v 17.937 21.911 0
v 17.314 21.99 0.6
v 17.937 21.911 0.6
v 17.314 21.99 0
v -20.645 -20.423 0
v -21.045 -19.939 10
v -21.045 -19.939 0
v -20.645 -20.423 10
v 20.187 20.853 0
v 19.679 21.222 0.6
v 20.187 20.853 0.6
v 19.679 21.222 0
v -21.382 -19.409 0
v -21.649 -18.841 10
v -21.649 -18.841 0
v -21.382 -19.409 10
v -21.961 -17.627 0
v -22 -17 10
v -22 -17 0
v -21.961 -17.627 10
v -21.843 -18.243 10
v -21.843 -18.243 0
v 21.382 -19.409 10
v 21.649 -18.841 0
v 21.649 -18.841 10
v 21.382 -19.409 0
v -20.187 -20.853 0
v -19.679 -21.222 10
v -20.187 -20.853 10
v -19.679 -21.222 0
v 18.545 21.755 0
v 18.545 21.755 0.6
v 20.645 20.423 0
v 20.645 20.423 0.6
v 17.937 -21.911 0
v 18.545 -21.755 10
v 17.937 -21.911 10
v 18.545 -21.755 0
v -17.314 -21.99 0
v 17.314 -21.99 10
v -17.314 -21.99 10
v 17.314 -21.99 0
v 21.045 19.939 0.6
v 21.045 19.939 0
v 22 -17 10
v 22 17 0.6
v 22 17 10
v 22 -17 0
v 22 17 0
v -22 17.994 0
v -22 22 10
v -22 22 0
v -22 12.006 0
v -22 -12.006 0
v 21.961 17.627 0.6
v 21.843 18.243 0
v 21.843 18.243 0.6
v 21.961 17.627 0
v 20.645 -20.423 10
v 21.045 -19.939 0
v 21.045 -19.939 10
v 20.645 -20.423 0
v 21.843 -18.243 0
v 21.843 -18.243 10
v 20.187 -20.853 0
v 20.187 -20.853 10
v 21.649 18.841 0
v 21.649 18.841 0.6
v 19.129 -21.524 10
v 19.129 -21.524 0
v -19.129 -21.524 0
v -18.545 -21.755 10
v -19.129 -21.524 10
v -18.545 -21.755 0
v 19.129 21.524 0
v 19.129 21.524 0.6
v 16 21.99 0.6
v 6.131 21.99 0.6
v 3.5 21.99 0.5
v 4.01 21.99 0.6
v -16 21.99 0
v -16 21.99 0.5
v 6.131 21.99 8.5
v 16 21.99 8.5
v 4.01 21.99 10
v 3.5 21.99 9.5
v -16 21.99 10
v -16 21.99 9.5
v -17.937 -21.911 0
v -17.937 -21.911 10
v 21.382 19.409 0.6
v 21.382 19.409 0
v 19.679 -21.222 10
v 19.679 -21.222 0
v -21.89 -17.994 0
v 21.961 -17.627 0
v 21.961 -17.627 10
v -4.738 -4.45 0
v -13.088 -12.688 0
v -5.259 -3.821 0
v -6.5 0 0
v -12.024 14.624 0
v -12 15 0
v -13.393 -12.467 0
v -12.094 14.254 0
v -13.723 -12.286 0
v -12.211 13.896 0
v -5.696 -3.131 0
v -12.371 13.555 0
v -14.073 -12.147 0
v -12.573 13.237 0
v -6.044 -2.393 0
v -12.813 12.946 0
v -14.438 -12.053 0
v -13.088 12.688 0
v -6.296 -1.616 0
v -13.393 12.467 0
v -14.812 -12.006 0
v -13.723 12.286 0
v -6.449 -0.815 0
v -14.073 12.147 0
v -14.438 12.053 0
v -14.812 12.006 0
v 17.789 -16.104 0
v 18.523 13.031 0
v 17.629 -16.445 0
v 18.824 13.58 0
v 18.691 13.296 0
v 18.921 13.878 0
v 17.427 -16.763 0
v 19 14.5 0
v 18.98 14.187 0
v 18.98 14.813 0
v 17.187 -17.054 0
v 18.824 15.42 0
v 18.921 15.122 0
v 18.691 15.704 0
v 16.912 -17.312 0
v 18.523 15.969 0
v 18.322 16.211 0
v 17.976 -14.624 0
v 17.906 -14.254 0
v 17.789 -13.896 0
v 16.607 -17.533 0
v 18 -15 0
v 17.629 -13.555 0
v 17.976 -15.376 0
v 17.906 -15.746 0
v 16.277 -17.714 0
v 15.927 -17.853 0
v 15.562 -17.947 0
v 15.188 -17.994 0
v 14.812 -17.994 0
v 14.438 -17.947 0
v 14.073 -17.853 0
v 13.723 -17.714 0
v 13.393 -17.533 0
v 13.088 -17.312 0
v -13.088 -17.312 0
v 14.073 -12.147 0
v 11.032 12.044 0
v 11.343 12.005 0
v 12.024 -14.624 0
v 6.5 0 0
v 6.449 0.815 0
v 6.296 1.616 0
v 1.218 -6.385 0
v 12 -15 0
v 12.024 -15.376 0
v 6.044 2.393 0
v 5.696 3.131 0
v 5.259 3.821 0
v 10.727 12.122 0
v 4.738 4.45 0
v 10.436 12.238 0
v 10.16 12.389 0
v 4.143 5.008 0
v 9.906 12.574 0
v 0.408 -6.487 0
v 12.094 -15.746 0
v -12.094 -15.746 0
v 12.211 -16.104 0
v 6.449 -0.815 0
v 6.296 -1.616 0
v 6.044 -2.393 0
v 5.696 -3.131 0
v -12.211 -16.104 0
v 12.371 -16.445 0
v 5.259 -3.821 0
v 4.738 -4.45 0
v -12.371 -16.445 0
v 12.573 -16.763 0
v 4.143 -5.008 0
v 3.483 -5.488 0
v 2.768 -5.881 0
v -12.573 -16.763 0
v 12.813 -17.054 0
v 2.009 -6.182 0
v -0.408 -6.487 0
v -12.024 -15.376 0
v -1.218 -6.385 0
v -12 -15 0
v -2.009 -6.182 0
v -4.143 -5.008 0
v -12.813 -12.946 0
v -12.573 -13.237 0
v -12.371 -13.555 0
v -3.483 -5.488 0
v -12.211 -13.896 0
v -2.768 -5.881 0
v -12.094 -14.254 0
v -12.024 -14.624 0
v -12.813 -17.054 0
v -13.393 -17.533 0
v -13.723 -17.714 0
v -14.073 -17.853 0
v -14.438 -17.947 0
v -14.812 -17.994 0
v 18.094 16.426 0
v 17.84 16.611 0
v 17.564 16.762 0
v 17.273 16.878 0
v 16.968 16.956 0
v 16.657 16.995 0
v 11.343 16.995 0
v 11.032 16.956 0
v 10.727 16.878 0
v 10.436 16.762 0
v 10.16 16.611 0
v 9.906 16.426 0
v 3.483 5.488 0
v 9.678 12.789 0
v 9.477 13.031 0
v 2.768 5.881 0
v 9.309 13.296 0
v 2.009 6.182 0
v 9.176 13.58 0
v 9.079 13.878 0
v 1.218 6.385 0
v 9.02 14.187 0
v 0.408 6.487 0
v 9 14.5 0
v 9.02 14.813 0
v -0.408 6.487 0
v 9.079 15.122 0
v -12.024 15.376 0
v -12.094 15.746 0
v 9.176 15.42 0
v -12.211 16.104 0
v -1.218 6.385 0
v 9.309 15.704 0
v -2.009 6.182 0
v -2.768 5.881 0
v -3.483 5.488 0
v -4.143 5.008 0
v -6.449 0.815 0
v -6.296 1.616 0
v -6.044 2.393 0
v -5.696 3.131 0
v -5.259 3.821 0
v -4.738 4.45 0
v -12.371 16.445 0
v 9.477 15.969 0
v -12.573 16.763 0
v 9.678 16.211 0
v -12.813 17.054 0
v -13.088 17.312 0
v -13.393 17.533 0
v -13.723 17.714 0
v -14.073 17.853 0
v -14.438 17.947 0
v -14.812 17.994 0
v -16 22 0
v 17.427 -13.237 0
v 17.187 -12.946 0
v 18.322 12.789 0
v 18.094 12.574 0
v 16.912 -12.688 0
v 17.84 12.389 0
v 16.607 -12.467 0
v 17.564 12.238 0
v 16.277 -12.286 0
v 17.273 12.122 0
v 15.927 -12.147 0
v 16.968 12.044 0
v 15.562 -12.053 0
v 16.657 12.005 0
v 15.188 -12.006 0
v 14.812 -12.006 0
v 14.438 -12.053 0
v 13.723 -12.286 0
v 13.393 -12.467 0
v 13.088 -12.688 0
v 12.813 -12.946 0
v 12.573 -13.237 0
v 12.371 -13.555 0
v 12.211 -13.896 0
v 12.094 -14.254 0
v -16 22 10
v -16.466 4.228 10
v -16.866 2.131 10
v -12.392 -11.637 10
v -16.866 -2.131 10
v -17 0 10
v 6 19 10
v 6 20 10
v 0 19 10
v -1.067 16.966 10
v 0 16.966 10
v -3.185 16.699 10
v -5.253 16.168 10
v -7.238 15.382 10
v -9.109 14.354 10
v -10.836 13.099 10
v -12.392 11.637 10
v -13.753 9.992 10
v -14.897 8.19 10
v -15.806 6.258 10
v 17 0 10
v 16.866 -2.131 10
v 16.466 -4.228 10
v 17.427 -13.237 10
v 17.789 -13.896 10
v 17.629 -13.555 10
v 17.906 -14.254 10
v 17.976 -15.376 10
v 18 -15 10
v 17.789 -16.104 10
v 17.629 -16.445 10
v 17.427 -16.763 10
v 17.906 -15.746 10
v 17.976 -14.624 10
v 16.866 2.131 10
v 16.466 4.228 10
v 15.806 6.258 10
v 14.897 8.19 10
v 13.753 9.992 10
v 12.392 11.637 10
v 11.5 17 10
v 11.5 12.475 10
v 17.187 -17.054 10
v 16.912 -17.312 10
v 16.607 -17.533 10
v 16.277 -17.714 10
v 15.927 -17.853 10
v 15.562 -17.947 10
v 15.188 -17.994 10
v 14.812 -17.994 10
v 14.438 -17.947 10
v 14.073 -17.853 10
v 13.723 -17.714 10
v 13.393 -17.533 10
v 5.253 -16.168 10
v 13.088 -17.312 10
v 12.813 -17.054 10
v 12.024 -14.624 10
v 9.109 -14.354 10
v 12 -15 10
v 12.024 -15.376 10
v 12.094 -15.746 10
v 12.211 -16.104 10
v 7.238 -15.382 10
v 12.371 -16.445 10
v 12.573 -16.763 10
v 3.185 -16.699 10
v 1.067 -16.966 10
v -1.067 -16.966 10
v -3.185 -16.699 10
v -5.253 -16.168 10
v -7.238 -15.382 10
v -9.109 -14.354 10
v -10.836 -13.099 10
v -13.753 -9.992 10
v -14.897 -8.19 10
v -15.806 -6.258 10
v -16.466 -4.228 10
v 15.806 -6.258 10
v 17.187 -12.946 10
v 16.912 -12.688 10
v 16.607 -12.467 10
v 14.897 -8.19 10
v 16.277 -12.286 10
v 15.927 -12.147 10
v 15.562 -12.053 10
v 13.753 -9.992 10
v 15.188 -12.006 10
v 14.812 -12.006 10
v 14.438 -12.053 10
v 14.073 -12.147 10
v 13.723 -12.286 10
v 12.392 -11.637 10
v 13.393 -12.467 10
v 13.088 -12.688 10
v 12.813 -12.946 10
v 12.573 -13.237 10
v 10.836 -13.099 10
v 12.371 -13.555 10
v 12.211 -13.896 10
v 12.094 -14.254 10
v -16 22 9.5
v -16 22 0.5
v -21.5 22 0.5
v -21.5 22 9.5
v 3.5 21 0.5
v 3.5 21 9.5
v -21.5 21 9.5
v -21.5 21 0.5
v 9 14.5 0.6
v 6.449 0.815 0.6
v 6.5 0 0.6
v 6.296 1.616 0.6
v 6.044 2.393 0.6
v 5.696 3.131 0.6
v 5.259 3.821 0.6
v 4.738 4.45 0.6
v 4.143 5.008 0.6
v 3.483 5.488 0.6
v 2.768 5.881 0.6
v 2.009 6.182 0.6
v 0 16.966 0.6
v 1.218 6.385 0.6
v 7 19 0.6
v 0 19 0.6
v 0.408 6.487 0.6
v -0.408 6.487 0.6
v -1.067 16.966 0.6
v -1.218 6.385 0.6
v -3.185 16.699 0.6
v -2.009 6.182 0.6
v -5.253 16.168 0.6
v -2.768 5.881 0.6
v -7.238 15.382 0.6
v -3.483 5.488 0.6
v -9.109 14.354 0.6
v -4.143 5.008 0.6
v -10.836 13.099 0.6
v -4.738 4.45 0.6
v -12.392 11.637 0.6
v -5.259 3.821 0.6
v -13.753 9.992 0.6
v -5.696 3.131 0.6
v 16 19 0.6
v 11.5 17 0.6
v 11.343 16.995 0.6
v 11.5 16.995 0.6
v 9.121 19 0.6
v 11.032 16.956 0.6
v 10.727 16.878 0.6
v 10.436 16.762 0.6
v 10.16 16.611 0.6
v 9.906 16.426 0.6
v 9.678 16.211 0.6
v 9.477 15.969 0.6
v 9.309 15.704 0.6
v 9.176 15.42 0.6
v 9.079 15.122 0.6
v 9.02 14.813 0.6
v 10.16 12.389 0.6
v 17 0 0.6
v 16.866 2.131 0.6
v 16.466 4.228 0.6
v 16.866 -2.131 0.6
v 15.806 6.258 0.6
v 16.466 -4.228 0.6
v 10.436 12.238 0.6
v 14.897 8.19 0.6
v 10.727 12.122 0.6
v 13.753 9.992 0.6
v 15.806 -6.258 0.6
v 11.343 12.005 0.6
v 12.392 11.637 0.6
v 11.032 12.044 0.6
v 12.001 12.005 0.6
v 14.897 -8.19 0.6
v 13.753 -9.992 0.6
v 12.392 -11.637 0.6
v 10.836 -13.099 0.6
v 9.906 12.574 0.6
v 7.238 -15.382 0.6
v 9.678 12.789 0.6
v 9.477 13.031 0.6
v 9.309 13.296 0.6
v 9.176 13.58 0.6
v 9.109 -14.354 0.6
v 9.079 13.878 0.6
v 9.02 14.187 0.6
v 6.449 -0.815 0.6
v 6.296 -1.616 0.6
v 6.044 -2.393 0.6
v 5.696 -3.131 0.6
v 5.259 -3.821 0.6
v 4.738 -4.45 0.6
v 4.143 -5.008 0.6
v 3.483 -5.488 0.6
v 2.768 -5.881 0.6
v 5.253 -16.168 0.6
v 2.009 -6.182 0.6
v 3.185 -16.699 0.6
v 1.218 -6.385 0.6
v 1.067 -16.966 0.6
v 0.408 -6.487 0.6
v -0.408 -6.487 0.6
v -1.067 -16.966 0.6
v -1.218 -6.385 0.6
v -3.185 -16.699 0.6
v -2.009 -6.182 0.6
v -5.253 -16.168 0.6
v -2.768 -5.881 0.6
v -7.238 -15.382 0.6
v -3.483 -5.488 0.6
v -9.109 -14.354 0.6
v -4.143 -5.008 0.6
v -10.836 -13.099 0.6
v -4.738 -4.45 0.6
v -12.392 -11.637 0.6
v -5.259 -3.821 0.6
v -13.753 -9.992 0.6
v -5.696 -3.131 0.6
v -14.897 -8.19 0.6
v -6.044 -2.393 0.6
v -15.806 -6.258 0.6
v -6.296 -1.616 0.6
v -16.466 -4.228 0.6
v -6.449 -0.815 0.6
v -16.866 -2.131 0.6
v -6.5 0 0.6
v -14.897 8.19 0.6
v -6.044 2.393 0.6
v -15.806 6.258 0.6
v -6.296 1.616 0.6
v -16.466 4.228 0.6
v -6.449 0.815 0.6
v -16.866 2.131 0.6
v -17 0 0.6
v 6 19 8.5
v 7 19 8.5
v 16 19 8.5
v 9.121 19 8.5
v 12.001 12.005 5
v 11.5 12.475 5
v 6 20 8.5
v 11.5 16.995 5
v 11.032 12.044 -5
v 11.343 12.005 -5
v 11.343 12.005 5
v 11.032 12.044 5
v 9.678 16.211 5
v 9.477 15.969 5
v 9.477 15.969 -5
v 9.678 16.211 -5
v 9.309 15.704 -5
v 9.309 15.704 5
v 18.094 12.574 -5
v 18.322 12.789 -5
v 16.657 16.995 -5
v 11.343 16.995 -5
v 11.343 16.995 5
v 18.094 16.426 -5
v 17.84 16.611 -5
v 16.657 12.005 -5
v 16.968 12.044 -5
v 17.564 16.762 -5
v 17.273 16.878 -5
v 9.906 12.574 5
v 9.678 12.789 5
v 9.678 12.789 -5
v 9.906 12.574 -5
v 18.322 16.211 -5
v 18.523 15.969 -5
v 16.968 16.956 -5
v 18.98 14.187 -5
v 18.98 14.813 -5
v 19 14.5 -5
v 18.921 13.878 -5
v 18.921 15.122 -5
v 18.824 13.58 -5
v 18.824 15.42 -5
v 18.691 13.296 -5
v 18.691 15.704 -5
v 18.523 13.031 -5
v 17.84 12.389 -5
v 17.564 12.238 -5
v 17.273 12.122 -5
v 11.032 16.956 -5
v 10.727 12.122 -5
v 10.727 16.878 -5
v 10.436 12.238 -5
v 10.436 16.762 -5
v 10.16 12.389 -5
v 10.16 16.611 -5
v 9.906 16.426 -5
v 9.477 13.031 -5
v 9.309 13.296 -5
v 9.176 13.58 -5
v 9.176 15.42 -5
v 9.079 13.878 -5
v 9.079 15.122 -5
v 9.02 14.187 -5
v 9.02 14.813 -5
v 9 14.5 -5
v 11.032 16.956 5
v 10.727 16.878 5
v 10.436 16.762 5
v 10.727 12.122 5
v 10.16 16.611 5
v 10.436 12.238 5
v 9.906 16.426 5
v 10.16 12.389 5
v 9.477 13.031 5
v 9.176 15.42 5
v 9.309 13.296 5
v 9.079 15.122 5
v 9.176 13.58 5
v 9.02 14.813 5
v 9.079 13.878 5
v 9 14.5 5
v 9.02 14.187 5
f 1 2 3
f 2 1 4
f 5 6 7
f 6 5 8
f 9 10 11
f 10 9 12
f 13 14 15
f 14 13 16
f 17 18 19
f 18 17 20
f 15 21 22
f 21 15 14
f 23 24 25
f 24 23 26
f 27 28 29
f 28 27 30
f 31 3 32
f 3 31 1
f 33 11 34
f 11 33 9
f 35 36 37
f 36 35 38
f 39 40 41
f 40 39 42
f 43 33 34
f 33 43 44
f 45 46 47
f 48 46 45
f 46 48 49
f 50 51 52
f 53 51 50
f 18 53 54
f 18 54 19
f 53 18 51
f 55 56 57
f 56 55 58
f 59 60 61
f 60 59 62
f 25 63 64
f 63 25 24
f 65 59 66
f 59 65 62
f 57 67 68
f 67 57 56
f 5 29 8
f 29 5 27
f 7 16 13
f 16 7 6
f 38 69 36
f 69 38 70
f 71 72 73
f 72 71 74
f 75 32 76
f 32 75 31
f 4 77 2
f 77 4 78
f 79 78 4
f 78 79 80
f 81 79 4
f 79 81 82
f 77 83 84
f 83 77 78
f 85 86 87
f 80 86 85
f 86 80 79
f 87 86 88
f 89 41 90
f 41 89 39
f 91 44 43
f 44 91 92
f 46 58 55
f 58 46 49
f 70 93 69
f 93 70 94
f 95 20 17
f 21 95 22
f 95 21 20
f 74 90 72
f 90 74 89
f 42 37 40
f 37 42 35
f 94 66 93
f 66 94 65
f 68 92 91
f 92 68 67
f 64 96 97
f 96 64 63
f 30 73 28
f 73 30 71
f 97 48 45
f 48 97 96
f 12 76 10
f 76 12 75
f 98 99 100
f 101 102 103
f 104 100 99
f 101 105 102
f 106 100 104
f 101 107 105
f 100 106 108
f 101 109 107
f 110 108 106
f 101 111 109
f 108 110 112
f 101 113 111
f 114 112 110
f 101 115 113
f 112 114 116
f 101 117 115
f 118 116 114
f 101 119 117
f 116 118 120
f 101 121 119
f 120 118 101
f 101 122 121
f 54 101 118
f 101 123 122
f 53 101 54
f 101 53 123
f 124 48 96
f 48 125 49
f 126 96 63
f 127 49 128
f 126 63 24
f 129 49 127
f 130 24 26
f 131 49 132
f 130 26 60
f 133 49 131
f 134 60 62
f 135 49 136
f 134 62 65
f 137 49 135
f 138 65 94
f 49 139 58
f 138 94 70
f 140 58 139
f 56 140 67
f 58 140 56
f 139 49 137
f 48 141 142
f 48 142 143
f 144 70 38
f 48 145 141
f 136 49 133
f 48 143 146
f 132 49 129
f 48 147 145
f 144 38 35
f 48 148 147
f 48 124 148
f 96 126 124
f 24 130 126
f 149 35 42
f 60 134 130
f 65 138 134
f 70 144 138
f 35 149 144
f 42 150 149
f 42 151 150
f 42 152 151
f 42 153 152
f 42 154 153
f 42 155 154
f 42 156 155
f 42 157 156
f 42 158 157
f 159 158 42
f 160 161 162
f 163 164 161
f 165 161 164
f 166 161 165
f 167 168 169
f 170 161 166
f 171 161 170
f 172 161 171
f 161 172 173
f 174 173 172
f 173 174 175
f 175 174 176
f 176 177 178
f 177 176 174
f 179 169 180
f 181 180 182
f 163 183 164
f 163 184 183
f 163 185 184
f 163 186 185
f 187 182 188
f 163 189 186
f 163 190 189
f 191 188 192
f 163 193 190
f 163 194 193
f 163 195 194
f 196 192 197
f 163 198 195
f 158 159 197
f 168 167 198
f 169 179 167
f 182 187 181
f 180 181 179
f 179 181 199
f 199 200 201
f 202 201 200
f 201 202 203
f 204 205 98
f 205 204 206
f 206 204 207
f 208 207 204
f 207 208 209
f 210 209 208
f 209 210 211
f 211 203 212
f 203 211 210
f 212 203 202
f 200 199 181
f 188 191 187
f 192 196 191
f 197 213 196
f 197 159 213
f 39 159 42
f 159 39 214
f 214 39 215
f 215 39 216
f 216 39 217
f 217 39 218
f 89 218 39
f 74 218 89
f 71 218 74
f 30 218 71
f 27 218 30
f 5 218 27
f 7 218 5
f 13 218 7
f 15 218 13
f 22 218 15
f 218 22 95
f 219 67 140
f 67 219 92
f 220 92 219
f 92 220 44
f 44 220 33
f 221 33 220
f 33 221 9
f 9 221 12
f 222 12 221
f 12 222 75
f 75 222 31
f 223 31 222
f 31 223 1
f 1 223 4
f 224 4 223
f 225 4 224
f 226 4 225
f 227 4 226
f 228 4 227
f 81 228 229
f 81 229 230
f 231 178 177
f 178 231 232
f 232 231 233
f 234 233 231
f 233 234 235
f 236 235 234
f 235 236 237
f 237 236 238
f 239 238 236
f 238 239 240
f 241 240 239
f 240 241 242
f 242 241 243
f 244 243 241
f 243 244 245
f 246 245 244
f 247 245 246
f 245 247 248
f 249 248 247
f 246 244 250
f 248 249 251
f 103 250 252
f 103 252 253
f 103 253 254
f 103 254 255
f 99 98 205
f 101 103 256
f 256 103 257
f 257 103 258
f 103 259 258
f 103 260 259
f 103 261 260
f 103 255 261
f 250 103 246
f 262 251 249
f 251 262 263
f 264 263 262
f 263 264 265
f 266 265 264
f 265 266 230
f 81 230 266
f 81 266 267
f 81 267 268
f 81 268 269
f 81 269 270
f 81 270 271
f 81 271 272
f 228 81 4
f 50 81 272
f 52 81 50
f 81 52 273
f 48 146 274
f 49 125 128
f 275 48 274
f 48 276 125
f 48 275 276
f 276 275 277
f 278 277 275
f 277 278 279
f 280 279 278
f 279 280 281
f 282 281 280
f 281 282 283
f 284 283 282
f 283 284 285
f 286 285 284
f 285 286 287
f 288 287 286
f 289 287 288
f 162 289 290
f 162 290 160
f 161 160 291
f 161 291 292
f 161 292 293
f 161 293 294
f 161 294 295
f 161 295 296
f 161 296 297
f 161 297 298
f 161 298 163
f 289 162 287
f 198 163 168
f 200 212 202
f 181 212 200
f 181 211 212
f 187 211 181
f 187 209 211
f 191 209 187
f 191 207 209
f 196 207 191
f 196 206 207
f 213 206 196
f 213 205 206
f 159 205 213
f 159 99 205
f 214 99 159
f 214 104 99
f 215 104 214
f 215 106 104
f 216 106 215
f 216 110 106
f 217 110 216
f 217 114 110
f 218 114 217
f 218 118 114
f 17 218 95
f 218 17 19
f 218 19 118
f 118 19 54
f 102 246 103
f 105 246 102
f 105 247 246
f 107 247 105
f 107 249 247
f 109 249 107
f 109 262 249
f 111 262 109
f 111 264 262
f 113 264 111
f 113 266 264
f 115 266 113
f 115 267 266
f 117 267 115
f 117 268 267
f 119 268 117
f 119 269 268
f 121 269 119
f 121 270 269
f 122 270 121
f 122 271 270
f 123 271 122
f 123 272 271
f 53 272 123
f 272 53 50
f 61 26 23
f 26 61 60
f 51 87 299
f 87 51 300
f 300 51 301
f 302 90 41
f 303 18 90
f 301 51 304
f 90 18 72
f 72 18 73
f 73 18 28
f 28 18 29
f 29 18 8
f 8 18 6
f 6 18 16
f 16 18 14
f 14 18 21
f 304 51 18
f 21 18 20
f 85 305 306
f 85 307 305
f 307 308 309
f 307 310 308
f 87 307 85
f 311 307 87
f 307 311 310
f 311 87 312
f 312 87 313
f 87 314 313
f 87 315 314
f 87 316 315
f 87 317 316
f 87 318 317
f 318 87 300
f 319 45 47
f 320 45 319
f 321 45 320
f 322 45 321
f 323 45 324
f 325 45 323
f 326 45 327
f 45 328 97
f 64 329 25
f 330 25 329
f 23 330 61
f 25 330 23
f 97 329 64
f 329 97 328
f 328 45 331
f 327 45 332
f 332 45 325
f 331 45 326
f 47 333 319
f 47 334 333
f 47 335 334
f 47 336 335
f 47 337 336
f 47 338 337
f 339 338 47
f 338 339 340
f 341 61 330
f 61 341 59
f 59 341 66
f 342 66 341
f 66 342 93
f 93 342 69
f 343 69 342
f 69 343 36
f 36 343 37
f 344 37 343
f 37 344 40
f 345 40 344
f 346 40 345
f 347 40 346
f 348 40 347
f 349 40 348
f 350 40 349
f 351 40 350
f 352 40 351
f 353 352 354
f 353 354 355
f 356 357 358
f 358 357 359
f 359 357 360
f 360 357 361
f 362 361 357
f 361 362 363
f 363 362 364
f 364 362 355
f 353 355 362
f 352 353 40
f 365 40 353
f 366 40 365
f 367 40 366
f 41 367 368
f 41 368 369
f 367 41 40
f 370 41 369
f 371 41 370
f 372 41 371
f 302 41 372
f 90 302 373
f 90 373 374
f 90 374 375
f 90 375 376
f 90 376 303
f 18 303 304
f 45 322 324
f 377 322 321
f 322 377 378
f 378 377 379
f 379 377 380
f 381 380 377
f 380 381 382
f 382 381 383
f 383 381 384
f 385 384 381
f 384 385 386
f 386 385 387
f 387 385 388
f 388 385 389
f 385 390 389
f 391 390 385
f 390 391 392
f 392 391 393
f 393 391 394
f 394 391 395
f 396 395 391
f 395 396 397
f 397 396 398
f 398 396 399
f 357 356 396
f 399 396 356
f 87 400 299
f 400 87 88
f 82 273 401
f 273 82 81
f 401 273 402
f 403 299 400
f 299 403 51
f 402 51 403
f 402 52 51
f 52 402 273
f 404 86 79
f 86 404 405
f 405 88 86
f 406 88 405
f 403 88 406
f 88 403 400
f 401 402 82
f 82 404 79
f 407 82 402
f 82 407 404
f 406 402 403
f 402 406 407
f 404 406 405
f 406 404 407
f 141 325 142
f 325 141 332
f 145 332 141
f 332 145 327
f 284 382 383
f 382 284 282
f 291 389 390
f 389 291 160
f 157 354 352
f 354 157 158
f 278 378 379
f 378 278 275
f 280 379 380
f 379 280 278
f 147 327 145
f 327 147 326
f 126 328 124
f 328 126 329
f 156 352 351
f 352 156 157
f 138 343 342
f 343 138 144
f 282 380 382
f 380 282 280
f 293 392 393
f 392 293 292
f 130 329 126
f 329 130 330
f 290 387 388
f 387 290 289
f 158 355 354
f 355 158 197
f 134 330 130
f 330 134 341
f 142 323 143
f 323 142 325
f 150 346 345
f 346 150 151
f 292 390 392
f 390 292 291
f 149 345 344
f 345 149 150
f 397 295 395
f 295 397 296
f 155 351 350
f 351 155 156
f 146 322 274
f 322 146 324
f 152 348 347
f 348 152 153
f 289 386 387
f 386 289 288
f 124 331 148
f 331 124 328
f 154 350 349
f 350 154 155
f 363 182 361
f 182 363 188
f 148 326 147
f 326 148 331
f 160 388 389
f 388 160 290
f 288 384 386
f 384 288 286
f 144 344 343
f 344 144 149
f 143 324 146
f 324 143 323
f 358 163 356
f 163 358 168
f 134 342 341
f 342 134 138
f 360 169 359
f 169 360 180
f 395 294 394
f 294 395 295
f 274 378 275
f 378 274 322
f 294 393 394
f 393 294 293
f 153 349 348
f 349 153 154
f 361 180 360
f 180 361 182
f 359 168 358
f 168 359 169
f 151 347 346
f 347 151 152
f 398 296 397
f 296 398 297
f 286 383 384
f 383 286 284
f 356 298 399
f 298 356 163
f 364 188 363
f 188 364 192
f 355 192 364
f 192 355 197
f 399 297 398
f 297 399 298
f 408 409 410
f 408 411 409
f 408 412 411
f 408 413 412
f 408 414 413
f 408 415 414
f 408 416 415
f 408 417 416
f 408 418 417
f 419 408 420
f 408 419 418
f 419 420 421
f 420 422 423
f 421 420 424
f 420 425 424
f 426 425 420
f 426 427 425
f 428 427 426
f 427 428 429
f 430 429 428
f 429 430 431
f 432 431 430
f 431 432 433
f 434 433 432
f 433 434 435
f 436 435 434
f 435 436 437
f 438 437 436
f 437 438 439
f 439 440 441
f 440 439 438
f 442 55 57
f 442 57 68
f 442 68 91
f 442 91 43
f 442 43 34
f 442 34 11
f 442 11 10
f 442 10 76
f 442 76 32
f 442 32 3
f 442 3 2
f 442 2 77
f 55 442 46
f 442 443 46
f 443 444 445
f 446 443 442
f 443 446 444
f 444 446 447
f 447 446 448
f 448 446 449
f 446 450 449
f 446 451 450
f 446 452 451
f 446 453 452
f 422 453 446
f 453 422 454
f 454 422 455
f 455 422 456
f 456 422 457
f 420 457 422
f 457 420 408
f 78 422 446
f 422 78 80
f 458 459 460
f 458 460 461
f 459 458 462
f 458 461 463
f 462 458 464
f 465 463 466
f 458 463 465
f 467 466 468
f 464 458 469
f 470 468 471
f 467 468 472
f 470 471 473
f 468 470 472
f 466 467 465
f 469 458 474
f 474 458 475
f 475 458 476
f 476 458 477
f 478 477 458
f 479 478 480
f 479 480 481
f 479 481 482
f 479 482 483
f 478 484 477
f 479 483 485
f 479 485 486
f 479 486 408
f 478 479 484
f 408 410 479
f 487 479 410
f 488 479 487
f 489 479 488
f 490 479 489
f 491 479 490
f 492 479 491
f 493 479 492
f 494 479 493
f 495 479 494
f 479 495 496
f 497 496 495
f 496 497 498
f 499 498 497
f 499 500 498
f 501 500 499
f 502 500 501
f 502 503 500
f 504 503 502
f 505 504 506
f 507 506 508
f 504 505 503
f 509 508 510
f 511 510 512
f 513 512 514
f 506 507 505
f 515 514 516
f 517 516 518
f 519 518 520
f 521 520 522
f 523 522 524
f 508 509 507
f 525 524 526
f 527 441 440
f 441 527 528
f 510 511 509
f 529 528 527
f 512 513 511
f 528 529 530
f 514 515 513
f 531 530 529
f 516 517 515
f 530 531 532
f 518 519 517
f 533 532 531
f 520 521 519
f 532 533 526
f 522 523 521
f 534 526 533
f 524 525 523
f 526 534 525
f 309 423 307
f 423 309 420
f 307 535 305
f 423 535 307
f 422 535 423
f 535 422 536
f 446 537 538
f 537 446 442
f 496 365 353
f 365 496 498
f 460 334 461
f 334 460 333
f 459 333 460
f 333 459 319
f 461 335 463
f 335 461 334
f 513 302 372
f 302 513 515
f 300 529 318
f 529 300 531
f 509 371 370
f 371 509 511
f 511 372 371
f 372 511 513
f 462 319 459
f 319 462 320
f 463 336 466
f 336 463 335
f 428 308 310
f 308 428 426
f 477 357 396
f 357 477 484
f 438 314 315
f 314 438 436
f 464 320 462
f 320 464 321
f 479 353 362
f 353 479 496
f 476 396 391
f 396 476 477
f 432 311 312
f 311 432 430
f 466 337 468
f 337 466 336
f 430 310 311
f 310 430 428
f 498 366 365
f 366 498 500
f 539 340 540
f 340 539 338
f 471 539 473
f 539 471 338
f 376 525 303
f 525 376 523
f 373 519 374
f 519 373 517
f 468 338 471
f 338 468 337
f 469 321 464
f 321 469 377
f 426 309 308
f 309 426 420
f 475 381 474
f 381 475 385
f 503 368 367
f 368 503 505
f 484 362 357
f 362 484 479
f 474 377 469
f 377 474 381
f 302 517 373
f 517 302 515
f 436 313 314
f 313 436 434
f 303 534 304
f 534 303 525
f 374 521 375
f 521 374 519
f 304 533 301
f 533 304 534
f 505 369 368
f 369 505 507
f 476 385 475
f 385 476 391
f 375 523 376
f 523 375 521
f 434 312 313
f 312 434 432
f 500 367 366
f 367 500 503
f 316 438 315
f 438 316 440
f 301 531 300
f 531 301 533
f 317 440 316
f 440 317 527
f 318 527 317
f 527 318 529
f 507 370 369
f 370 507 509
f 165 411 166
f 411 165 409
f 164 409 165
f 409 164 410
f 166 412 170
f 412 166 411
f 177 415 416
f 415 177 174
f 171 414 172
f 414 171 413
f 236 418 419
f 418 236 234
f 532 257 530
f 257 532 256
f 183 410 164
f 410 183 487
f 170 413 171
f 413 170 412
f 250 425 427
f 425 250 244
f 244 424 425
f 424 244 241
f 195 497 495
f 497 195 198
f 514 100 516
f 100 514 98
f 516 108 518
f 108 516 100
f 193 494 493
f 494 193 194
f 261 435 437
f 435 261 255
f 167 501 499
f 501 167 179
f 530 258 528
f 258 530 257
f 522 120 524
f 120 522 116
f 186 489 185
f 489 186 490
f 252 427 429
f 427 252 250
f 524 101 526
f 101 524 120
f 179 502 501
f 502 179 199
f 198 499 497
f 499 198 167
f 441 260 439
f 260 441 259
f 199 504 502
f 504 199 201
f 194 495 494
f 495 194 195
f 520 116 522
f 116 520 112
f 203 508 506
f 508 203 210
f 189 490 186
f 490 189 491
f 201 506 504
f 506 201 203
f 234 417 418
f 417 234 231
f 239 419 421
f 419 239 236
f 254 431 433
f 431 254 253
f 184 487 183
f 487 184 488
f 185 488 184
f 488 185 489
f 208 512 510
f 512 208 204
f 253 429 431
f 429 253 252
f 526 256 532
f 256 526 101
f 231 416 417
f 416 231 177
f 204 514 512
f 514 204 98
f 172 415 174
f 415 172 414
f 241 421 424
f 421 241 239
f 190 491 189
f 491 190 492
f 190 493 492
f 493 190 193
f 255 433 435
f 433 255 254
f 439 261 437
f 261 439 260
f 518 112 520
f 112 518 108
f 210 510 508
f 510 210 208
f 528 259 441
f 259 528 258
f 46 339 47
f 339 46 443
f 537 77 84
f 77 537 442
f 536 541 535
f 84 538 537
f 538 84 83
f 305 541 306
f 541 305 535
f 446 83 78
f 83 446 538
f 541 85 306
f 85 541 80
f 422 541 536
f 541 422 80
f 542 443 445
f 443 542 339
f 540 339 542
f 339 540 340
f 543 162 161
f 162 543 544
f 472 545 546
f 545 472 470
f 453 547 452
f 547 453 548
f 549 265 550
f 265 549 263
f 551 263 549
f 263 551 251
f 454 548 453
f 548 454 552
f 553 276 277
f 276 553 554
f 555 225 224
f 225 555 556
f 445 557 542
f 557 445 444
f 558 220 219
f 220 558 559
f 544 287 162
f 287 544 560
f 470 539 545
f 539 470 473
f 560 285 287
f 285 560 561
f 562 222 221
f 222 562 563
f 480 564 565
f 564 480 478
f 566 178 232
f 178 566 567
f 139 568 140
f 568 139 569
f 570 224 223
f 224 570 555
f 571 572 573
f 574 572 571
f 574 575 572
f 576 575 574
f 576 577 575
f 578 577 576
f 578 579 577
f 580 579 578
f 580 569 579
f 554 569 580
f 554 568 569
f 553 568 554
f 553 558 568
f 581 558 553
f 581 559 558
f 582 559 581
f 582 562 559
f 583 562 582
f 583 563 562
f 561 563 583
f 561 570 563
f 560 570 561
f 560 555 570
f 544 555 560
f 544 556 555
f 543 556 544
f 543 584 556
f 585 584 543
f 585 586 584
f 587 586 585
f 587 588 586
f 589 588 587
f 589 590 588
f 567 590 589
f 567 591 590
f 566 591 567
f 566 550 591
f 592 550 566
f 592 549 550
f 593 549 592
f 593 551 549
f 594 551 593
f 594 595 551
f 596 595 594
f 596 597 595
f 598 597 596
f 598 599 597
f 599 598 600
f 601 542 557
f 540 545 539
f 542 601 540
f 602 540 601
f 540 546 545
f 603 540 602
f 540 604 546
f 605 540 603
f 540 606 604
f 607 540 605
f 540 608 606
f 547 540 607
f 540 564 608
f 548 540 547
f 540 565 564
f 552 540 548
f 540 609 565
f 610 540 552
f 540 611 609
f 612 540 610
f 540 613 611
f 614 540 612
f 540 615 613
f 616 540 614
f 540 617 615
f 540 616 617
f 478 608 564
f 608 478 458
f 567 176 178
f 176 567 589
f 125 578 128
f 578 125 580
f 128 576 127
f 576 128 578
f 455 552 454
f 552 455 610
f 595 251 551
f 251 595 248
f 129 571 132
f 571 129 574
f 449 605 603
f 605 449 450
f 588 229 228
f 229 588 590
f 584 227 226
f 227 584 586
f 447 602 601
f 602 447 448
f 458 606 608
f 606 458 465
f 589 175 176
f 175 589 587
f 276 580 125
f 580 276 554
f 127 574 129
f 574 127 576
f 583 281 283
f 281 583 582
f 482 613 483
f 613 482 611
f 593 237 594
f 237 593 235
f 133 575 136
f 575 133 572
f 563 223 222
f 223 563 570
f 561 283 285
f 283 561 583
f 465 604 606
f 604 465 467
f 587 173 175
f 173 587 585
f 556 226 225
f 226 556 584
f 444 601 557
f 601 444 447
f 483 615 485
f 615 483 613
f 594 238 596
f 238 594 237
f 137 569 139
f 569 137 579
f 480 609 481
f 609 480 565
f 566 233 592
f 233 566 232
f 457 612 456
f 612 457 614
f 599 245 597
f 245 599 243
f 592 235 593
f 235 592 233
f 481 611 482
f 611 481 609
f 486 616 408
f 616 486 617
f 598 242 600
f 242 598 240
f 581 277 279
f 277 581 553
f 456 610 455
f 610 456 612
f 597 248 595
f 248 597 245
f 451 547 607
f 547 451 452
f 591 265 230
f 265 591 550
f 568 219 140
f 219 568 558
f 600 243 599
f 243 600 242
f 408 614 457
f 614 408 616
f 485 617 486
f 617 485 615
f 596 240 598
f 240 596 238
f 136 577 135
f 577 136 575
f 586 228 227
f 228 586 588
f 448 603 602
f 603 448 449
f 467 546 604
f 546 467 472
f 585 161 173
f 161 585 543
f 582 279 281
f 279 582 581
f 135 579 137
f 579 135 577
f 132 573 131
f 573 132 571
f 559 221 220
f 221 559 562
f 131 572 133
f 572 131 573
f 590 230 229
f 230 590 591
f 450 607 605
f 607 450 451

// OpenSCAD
$fn = 50;


union() {
	difference() {
		union() {
			hull() {
				translate(v = [-17.0000000000, 17.0000000000, 0]) {
					cylinder(h = 10, r = 5);
				}
				translate(v = [17.0000000000, 17.0000000000, 0]) {
					cylinder(h = 10, r = 5);
				}
				translate(v = [-17.0000000000, -17.0000000000, 0]) {
					cylinder(h = 10, r = 5);
				}
				translate(v = [17.0000000000, -17.0000000000, 0]) {
					cylinder(h = 10, r = 5);
				}
			}
			translate(v = [-22.0000000000, 16.0000000000, 0]) {
				cube(size = [6, 6, 10]);
			}
		}
		union() {
			translate(v = [-22.5000000000, -15.0000000000, -250.0000000000]) {
				rotate(a = [0, 0, 0]) {
					difference() {
						union() {
							hull() {
								translate(v = [7.5000000000, 0, 0]) {
									cylinder(h = 250, r = 3.0000000000, r1 = 3.0000000000, r2 = 3.0000000000);
								}
								translate(v = [-7.5000000000, 0, 0]) {
									cylinder(h = 250, r = 3.0000000000, r1 = 3.0000000000, r2 = 3.0000000000);
								}
							}
						}
						union();
					}
				}
			}
			translate(v = [-22.5000000000, 15.0000000000, -250.0000000000]) {
				rotate(a = [0, 0, 0]) {
					difference() {
						union() {
							hull() {
								translate(v = [7.5000000000, 0, 0]) {
									cylinder(h = 250, r = 3.0000000000, r1 = 3.0000000000, r2 = 3.0000000000);
								}
								translate(v = [-7.5000000000, 0, 0]) {
									cylinder(h = 250, r = 3.0000000000, r1 = 3.0000000000, r2 = 3.0000000000);
								}
							}
						}
						union();
					}
				}
			}
			translate(v = [-21.5000000000, 21.0000000000, 0.5000000000]) {
				cube(size = [25, 1, 9.0000000000]);
			}
			translate(v = [15.0000000000, -15.0000000000, 0]) {
				cylinder(h = 100, r = 3.0000000000);
			}
			translate(v = [0.0000000000, 11.0000000000, 0.6000000000]) {
				cube(size = [11, 8, 12.4000000000]);
			}
			translate(v = [0, 0, 0.6000000000]) {
				cylinder(h = 12.4000000000, r = 17.0000000000);
			}
			translate(v = [0, 0, -5.0000000000]) {
				cylinder(h = 10, r = 6.5000000000);
			}
			translate(v = [0.0000000000, 17.0000000000, 0.6000000000]) {
				cube(size = [22.0000000000, 2, 12.4000000000]);
			}
			translate(v = [16.0000000000, 17.0000000000, 0.6000000000]) {
				cube(size = [6, 5, 12.4000000000]);
			}
			translate(v = [6.0000000000, 17.0000000000, 8.5000000000]) {
				cube(size = [16, 5, 1.5000000000]);
			}
			translate(v = [3.2500000000, 22.7500000000, 0.6000000000]) {
				rotate(a = [0, 0, -45]) {
					cube(size = [7.5000000000, 1.5000000000, 12.4000000000]);
				}
			}
			translate(v = [2.5000000000, 12.0000000000, 0.6000000000]) {
				cube(size = [9.0000000000, 5, 9.4000000000]);
			}
		}
	}
	union() {
		translate(v = [14, 14.5000000000, -5.0000000000]) {
			rotate(a = [0, 0, 0]) {
				difference() {
					union() {
						#hull() {
							#translate(v = [2.5000000000, 0, 0]) {
								cylinder(h = 10, r = 2.5000000000, r1 = 2.5000000000, r2 = 2.5000000000);
							}
							#translate(v = [-2.5000000000, 0, 0]) {
								cylinder(h = 10, r = 2.5000000000, r1 = 2.5000000000, r2 = 2.5000000000);
							}
						}
					}
					union();
				}
			}
		}
	}
}
